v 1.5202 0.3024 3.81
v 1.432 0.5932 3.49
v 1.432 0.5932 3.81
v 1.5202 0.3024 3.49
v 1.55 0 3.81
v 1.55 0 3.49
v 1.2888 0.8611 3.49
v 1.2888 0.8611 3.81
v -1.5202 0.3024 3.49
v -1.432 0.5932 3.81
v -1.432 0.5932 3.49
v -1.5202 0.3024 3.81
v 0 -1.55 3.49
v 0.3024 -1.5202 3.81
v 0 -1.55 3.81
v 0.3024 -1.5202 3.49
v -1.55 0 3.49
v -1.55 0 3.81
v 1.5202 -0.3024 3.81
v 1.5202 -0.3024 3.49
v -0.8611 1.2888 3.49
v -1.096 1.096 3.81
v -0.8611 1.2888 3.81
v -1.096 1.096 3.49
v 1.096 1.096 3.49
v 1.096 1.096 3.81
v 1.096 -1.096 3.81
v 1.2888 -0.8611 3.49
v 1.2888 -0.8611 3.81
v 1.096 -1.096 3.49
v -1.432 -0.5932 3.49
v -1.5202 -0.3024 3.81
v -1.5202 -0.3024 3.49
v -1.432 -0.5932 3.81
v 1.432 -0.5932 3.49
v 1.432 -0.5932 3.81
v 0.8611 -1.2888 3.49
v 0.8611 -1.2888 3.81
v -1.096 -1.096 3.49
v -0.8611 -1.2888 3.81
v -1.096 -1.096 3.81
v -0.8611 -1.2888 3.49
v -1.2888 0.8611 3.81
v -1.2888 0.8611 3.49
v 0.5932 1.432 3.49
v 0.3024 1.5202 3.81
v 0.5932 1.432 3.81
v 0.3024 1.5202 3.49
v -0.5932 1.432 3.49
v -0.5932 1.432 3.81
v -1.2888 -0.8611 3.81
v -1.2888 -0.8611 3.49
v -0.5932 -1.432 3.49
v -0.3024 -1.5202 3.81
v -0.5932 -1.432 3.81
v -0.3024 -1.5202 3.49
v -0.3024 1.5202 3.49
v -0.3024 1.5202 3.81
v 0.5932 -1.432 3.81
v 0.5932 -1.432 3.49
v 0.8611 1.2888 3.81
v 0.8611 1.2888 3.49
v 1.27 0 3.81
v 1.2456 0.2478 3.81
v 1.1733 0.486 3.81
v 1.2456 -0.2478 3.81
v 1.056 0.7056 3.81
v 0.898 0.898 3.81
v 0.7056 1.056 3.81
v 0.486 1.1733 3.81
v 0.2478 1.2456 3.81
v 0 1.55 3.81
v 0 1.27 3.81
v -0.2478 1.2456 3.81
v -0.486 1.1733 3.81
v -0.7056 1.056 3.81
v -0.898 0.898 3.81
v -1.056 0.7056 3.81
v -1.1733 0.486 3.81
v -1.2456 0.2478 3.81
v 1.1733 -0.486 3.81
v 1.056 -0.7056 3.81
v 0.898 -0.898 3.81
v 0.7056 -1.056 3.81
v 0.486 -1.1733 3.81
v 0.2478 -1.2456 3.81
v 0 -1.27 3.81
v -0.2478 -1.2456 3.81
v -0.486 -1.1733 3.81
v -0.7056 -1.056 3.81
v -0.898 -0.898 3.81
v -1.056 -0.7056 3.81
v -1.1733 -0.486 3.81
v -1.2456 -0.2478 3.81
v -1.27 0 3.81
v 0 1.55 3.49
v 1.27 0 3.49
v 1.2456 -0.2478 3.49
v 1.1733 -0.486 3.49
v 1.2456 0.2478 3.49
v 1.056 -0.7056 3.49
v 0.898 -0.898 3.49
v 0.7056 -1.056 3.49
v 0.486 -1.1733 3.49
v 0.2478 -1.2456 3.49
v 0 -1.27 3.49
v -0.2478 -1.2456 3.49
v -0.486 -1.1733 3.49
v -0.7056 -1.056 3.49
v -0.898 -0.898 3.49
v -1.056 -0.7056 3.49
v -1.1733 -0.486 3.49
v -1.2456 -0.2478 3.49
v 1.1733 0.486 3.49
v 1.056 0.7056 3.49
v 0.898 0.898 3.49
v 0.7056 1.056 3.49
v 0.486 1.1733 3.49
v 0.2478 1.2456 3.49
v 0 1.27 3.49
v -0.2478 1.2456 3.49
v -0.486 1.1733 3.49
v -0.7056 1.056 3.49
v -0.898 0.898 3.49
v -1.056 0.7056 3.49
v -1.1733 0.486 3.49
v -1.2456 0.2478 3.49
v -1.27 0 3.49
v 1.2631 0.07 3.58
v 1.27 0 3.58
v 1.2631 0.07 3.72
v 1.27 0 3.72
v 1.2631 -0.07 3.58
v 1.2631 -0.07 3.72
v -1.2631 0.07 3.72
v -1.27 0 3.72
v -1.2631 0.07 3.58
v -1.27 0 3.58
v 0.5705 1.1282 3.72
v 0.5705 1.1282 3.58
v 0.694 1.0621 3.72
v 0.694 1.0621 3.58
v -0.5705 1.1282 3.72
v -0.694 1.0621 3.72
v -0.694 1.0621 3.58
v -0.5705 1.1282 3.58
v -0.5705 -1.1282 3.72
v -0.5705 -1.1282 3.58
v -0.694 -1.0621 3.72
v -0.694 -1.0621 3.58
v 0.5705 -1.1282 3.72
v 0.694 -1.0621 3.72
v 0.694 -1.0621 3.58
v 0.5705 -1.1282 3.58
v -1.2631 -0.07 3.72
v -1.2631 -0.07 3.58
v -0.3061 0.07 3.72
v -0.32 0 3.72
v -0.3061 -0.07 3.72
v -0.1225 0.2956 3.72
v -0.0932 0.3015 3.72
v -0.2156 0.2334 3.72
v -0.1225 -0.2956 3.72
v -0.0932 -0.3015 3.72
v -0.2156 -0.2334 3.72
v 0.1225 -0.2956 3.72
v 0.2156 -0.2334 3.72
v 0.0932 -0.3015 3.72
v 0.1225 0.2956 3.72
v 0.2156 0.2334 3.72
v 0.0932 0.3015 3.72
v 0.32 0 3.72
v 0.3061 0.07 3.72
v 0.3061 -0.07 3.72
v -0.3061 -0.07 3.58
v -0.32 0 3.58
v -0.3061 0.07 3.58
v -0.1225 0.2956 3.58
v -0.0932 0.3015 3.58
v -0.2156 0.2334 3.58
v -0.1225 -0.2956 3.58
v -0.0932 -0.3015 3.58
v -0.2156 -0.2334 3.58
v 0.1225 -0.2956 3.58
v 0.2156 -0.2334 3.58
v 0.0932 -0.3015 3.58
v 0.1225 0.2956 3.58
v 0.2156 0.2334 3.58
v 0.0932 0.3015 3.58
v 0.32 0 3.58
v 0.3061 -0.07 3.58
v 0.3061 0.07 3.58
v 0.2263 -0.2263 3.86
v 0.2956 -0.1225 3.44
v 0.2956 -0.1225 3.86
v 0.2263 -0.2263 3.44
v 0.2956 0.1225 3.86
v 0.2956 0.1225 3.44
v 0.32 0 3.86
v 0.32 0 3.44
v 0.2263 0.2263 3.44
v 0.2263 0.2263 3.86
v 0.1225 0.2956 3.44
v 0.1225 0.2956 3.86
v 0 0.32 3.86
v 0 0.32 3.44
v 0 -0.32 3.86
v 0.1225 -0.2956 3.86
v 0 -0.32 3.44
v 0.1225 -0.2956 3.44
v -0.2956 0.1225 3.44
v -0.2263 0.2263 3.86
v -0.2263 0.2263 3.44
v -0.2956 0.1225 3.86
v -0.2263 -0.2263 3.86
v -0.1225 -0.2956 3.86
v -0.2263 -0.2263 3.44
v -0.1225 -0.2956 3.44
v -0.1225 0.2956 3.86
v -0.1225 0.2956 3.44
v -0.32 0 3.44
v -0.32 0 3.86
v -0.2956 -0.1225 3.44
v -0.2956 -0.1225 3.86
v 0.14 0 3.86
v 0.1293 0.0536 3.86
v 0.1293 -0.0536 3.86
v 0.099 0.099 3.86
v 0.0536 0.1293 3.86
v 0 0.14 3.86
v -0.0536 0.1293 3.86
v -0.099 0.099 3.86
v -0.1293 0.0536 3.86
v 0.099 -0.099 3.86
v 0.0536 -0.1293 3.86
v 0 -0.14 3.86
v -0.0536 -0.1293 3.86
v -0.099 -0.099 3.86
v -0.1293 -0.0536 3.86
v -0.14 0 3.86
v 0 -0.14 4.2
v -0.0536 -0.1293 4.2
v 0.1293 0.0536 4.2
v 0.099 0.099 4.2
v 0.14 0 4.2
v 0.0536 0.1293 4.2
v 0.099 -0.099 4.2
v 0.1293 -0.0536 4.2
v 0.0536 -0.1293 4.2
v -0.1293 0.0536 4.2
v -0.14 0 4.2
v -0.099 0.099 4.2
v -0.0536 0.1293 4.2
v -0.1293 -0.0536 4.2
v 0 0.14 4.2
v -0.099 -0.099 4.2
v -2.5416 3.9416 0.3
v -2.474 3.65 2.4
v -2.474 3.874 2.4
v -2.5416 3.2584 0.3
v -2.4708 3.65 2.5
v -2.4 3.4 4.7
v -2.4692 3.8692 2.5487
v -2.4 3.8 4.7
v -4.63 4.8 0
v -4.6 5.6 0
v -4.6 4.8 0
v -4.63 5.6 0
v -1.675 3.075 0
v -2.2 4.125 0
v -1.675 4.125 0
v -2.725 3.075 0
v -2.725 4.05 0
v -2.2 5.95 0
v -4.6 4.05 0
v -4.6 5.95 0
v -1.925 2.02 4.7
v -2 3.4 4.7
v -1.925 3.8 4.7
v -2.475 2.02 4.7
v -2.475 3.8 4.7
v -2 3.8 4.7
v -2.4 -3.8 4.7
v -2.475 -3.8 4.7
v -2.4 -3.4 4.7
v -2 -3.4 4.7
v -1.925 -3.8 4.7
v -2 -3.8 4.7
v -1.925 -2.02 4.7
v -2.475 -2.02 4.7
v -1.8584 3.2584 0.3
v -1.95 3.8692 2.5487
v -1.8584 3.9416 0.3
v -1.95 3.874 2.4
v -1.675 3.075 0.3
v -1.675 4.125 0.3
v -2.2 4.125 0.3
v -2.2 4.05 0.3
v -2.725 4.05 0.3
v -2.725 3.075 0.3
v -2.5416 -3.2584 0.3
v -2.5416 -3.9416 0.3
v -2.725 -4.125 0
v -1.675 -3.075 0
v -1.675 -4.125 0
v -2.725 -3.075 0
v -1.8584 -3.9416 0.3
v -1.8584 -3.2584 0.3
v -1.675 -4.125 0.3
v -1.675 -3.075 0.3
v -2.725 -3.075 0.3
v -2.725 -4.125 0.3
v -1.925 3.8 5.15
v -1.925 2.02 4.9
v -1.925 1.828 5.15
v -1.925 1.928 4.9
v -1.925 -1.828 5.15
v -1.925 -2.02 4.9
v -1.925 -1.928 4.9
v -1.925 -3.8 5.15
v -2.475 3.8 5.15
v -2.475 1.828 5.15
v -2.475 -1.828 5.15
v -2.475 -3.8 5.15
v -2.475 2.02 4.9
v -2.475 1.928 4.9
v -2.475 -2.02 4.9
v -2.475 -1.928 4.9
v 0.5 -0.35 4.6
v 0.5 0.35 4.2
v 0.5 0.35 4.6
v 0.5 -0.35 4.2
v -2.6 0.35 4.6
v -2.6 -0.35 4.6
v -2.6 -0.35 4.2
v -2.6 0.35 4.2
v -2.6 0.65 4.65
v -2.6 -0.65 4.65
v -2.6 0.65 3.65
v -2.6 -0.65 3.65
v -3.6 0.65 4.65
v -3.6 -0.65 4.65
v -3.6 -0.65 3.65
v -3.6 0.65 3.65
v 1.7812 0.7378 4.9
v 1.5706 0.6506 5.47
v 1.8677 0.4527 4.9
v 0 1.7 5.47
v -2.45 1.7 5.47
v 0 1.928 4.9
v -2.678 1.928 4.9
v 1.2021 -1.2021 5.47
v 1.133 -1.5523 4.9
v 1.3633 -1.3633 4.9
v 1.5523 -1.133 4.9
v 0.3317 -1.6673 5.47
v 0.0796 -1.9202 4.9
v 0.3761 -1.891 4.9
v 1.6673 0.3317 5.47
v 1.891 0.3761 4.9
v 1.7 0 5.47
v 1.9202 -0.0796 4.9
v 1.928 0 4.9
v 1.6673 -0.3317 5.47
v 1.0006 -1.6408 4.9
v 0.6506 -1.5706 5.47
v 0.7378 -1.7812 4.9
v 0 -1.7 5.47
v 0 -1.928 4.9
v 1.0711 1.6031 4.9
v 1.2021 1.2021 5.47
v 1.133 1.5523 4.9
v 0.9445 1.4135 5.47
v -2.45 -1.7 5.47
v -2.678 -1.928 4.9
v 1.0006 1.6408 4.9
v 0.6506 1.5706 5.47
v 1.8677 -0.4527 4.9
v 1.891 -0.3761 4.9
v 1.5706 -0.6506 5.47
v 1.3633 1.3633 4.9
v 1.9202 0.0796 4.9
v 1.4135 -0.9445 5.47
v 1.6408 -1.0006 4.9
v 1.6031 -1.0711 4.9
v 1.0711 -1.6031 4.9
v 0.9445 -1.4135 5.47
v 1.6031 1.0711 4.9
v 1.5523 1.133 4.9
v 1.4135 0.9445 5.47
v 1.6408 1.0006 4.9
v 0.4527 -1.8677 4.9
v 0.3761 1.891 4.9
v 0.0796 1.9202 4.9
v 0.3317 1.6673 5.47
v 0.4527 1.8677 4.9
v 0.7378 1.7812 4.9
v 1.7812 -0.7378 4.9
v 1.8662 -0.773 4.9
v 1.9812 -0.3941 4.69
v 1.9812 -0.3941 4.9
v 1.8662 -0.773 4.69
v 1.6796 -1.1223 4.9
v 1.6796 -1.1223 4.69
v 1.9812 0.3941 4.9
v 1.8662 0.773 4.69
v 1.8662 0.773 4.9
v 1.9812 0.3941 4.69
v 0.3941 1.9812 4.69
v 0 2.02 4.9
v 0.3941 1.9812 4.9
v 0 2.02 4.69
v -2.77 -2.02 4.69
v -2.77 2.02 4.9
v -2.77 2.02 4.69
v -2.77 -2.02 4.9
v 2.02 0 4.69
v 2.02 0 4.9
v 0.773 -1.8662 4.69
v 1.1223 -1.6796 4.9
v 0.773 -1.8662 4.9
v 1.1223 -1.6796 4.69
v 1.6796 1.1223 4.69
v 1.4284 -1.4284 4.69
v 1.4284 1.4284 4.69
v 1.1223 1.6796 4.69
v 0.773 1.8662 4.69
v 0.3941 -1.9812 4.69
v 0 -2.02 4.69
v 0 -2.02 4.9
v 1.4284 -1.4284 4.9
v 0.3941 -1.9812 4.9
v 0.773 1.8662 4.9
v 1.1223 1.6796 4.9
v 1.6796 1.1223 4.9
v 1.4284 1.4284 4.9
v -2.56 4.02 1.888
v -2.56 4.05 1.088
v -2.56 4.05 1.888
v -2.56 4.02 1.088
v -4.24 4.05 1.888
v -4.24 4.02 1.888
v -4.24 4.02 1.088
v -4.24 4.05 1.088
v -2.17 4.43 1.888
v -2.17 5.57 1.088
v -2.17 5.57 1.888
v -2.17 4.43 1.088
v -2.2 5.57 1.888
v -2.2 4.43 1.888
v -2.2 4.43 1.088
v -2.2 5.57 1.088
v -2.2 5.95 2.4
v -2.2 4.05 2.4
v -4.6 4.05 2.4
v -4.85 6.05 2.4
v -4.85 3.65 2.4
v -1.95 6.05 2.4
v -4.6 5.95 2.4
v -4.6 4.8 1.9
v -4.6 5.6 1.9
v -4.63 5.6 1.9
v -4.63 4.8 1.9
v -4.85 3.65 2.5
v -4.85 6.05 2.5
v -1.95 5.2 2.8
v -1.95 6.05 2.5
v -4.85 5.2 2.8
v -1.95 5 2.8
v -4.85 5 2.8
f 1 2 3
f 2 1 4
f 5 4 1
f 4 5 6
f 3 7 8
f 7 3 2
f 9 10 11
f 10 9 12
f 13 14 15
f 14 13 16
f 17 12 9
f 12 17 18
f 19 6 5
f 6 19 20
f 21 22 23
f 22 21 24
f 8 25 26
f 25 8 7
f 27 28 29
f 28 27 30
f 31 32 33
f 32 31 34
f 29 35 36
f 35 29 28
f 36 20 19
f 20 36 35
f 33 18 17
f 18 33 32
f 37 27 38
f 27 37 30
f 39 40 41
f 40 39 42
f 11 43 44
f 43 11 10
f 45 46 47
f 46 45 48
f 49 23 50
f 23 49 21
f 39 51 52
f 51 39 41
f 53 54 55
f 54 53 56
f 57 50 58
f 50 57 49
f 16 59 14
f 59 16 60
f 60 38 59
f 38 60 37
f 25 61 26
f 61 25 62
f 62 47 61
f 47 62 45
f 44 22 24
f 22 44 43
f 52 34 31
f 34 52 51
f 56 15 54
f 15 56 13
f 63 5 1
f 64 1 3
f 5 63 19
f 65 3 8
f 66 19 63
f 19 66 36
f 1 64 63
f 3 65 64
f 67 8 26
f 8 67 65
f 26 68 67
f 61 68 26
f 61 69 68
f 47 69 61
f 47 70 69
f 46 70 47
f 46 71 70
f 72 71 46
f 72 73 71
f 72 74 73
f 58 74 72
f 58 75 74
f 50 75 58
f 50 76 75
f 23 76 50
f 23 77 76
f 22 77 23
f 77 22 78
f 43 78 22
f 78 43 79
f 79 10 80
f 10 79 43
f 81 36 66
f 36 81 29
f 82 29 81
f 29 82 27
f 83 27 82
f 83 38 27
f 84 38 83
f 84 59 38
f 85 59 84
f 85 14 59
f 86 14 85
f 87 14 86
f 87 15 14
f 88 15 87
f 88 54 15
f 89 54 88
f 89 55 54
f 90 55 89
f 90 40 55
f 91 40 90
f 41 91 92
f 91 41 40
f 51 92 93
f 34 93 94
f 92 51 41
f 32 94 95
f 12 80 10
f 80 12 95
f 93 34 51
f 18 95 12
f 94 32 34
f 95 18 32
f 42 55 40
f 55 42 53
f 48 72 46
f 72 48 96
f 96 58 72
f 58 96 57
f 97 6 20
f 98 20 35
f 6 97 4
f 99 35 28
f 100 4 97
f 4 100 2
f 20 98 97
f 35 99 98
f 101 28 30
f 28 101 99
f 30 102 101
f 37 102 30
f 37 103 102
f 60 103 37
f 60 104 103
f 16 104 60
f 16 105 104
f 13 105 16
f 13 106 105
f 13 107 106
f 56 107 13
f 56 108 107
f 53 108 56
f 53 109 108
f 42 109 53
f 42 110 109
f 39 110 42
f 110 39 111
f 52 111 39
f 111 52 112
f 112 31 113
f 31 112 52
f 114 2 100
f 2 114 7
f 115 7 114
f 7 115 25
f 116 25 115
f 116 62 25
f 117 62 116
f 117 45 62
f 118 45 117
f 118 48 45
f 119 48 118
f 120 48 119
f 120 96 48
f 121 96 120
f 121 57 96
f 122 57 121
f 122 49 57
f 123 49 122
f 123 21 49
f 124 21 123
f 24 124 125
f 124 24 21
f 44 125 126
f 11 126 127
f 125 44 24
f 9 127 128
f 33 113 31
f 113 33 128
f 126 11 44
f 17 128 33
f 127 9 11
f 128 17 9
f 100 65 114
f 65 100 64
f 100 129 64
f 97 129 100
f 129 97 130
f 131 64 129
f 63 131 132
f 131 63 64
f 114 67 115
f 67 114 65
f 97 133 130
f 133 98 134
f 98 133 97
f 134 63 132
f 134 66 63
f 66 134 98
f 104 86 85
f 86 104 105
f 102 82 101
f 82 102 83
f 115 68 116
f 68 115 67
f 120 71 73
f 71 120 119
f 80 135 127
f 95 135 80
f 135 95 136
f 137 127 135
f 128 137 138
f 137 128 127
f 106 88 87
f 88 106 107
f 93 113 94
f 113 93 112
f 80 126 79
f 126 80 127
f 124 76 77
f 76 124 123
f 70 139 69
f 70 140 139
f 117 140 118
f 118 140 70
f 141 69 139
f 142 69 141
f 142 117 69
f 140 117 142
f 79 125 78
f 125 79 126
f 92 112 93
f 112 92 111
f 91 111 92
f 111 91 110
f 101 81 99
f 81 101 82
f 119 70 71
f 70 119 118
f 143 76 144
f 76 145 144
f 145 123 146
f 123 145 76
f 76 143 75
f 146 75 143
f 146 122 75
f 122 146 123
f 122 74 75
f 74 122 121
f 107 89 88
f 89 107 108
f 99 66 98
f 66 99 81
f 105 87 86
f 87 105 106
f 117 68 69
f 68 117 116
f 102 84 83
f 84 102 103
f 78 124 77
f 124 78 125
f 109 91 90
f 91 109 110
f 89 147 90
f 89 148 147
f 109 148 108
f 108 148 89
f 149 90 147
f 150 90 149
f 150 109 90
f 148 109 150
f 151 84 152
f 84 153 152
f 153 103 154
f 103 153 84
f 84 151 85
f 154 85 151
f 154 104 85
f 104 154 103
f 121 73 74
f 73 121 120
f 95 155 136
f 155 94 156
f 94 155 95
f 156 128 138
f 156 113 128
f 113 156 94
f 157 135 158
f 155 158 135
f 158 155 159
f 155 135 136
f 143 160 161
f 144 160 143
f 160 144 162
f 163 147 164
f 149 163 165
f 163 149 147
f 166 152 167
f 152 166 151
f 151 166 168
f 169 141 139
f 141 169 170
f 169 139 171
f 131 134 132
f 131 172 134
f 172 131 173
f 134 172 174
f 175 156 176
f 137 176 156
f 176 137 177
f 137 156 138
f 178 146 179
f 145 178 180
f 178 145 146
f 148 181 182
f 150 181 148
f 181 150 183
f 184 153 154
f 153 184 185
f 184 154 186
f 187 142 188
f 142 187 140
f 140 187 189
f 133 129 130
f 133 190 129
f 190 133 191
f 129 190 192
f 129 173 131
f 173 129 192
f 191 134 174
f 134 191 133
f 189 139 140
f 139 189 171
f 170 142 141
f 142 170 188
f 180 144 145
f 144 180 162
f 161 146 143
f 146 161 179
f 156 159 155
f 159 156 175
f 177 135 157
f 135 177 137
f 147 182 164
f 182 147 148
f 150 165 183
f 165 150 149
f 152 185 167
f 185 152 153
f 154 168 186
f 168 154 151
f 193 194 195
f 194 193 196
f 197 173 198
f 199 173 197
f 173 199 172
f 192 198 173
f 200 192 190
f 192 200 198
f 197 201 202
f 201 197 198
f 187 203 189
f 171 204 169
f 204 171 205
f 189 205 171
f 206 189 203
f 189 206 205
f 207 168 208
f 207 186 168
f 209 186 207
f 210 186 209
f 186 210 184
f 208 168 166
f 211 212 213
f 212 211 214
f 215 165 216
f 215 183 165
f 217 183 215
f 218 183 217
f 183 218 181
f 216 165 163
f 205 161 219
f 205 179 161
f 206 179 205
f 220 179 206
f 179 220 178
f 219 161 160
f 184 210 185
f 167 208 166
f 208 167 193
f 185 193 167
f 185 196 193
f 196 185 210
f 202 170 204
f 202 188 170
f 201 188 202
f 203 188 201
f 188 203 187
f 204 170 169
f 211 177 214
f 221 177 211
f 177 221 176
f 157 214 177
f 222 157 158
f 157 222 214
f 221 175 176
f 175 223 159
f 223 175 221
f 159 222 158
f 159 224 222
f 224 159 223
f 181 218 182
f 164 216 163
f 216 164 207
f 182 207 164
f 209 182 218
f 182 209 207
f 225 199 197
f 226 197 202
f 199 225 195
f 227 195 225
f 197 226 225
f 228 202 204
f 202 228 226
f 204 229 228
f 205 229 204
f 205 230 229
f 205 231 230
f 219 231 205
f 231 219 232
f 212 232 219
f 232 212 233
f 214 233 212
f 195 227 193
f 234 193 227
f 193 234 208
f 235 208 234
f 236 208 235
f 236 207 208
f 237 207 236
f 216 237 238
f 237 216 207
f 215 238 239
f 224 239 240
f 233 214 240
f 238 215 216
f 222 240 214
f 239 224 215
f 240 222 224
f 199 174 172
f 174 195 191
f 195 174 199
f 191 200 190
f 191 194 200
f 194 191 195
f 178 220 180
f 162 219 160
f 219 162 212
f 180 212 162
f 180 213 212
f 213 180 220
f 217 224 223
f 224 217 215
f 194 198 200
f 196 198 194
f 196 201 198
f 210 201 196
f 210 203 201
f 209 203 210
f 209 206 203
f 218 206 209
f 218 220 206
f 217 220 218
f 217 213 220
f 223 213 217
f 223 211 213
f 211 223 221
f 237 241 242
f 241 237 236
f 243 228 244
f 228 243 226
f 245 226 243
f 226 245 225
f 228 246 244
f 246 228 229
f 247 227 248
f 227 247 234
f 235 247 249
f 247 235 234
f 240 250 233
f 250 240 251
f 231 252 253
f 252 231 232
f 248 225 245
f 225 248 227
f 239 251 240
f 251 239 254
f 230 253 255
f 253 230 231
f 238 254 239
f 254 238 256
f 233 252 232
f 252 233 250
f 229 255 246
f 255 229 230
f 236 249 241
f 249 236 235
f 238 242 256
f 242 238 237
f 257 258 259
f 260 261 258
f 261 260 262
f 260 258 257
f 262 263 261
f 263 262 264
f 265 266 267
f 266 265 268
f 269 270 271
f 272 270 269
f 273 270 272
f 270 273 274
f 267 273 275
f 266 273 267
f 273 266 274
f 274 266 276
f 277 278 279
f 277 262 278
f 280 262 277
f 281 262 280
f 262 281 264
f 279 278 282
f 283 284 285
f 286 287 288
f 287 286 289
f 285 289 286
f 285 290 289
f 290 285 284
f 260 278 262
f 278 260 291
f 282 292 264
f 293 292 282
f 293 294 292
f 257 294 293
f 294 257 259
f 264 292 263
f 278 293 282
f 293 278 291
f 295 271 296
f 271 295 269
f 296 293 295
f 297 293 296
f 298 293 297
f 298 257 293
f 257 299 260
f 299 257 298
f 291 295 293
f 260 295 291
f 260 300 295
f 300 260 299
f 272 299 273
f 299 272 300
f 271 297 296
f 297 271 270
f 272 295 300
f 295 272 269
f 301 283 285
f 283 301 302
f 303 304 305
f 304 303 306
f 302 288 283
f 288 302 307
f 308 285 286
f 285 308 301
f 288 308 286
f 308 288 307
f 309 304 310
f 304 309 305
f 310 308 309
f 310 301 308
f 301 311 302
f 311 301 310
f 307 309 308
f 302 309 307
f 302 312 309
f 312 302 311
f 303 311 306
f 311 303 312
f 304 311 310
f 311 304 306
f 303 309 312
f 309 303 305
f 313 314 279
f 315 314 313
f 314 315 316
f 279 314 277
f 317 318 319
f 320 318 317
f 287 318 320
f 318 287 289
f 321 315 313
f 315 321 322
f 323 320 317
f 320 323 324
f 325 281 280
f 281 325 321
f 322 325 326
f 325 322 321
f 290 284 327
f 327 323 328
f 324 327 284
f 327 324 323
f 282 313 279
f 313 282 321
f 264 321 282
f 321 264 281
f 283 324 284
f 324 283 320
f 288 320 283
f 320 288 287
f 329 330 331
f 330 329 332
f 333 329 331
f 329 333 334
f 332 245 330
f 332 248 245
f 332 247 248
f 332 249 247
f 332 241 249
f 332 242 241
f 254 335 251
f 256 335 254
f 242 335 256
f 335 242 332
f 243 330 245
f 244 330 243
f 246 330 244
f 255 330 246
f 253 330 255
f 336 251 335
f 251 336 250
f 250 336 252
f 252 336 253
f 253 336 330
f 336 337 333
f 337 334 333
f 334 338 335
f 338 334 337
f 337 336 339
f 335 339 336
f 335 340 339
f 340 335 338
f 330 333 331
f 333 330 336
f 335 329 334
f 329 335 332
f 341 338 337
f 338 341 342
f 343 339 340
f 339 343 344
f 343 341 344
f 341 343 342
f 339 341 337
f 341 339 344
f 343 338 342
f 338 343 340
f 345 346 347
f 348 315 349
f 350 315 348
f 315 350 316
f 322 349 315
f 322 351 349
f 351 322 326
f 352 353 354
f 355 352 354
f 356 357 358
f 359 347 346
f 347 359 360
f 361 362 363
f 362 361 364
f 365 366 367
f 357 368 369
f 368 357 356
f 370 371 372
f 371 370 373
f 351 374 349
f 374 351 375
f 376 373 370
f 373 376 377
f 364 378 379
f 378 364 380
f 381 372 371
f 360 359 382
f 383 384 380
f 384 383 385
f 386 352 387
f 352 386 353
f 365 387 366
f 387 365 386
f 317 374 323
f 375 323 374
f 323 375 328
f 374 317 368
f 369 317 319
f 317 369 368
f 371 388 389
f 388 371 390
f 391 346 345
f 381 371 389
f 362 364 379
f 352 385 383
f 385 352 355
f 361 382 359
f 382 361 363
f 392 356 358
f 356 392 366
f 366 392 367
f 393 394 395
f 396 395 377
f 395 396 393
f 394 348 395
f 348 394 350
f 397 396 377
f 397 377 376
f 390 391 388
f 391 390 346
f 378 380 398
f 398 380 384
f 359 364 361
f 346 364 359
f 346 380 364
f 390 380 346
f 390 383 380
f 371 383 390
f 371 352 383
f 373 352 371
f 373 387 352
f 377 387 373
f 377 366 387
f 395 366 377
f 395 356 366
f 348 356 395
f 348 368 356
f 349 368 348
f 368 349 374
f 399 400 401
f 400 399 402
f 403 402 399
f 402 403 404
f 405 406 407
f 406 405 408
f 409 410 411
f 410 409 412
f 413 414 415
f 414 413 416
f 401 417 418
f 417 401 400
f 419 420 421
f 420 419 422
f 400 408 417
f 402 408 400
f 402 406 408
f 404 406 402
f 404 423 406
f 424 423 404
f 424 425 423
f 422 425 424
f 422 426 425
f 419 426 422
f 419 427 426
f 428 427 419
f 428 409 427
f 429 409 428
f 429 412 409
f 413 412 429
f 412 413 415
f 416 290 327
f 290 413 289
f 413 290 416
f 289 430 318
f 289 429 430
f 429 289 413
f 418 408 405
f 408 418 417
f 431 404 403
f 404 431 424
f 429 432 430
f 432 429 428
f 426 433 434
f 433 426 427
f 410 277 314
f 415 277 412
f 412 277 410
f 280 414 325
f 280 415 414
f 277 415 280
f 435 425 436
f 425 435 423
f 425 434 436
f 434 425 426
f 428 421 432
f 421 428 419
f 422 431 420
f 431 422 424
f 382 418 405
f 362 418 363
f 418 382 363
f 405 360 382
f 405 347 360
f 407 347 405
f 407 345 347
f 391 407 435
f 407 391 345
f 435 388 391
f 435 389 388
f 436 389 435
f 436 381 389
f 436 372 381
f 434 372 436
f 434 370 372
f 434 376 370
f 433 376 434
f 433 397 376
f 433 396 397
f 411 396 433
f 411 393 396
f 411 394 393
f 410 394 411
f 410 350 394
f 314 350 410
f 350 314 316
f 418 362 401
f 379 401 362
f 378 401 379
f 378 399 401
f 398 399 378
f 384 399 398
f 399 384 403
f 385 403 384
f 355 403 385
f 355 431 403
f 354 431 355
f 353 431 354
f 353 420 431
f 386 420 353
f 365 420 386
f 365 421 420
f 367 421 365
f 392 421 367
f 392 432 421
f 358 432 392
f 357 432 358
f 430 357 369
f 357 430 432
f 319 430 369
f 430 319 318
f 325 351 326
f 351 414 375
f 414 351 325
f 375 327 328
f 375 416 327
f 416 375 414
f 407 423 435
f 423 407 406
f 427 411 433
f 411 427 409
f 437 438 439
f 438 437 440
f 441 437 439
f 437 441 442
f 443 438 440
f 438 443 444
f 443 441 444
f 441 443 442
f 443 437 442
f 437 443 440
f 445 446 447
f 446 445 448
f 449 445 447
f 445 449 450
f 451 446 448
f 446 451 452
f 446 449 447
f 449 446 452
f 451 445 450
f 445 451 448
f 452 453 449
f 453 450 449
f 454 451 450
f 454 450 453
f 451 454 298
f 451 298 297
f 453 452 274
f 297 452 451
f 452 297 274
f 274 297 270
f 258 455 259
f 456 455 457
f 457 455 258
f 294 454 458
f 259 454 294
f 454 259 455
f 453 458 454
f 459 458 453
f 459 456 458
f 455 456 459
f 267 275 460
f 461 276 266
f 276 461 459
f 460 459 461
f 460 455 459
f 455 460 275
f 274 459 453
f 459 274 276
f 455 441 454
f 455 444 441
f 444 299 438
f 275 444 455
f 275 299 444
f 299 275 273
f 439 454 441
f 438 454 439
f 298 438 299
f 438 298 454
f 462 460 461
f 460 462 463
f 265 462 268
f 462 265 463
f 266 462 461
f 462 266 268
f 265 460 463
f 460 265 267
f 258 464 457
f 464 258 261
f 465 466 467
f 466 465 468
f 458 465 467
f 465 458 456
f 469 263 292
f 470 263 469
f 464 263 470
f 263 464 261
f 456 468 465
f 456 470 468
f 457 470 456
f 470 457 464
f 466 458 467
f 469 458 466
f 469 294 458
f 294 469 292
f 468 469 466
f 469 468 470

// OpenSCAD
// Lift station — chairlift bottom / top terminal. A portal frame stands
// behind the load point and carries a boom; the bullwheel hangs from the
// boom under a shallow terminal hood, with an operator's hut beside the
// line.
//
// The bullwheel is centred on the origin at cable height (BullwheelHeight
// in internal/world/lift.go) with its rim at the cable gap (CableGap), so
// the up and down cables, which end at the origin 1.5 m either side, meet
// the wheel where they would wrap it. Chairs turn around at the origin and
// only run on the +X side, and the lift line queues along -X on the
// centreline (Lift.QueueSlotXZ), so the frame keeps its legs outside the
// chairs' sweep and nothing stands on the centreline at ground level.
//
// Sides: chairs carry riders up on -Y (the game's +Z after export) and
// come back empty on +Y, so the hut stands on +Y.
//
// Conventions, units, and axis docs: see models-src/README.md.

$fn = 16;

// ── Dimensions (metres) ────────────────────────────────────────────────
cable_h   = 3.65; // world.BullwheelHeight: cable height at the wheel
cable_gap = 1.50; // world.CableGap: up / down cable either side of the axis

// Bullwheel — vertical axis, horizontal disc, rim at the cable gap.
bw_r      = cable_gap + 0.05; // rim outer radius; the cable sits in its groove
bw_rim    = 0.28;             // radial depth of the rim
bw_thick  = 0.32;
hub_r     = 0.32;
spokes    = 6;

// Portal frame behind the wheel.
frame_x   = -2.2;  // legs and crossbeam, behind the wheel's rim
leg_y     = 3.6;   // outside the chairs (cable gap + about a chair's width)
leg_base  = 0.70;  // leg footprint at the ground
leg_top   = 0.40;  // and where it meets the crossbeam
frame_h   = 4.70;  // underside of the crossbeam
beam_h    = 0.45;  // crossbeam depth

// Boom from the crossbeam out over the wheel.
boom_w    = 0.70;
boom_h    = 0.40;
boom_z    = frame_h - 0.10 - boom_h; // just under the crossbeam

// Terminal hood over the wheel and boom.
hood_r    = 2.00;  // front radius, over the wheel
hood_back = -2.75; // back edge, past the crossbeam
hood_z    = frame_h;
hood_h    = 0.75;
hood_in   = 0.30;  // top edge inset, for a chamfered look

// Operator hut beside the empty side of the line.
hut_x     = -3.4;
hut_y     = 5.0;
hut_l     = 2.4;   // along X
hut_w     = 1.9;   // along Y
hut_h     = 2.4;

// ── Bullwheel ──────────────────────────────────────────────────────────
module bullwheel() {
    translate([0, 0, cable_h]) {
        // Rim: a ring whose outer edge carries the cable.
        color("Goldenrod")
            difference() {
                cylinder(h = bw_thick, r = bw_r, center = true, $fn = 32);
                cylinder(h = bw_thick + 0.02, r = bw_r - bw_rim, center = true, $fn = 32);
            }
        // Spokes and hub.
        color("DarkSlateGray") {
            for (i = [0 : spokes - 1])
                rotate([0, 0, i * 360 / spokes])
                    translate([(bw_r - bw_rim / 2) / 2, 0, 0])
                        cube([bw_r - bw_rim / 2, 0.14, 0.14], center = true);
            cylinder(h = 0.42, r = hub_r, center = true);
        }
    }
    // Shaft up to the boom.
    color("DimGray")
        translate([0, 0, cable_h + 0.2])
            cylinder(h = boom_z - cable_h - 0.2 + 0.01, r = 0.14);
}

// ── Portal frame and boom ──────────────────────────────────────────────
module leg(y) {
    color("SlateGray")
        hull() {
            translate([frame_x, y, 0.02])
                cube([leg_base, leg_base, 0.04], center = true);
            translate([frame_x, y, frame_h - 0.02])
                cube([leg_top, leg_top, 0.04], center = true);
        }
    // Concrete footing.
    color("Silver")
        translate([frame_x, y, 0.15])
            cube([leg_base + 0.35, leg_base + 0.35, 0.30], center = true);
}

module frame() {
    leg(leg_y);
    leg(-leg_y);
    color("SlateGray")
        translate([frame_x, 0, frame_h + beam_h / 2])
            cube([0.55, 2 * leg_y + leg_top, beam_h], center = true);
    // Boom: from behind the crossbeam out past the wheel's centre.
    color("LightSlateGray")
        translate([(frame_x - 0.4 + 0.5) / 2, 0, boom_z + boom_h / 2])
            cube([0.5 - (frame_x - 0.4), boom_w, boom_h], center = true);
    // Drive housing on the back of the crossbeam.
    color("DimGray")
        translate([frame_x - 0.9, 0, frame_h - 0.55])
            cube([1.0, 1.3, 1.0], center = true);
}

// ── Hood ───────────────────────────────────────────────────────────────
// A slab rounded over the wheel and square at the back, its top edge
// drawn in.
module hood_slab(inset, z) {
    translate([0, 0, z])
        hull() {
            cylinder(h = 0.02, r = hood_r - inset, $fn = 32);
            translate([hood_back + inset, -(hood_r - inset), 0])
                cube([0.02, 2 * (hood_r - inset), 0.02]);
        }
}

module hood() {
    color("Gainsboro")
        hull() {
            hood_slab(0, hood_z);
            hood_slab(hood_in, hood_z + hood_h);
        }
    // A coloured band round the hood's lower edge.
    color("SteelBlue")
        hull() {
            hood_slab(-0.02, hood_z - 0.01);
            hood_slab(-0.02, hood_z + 0.18);
        }
}

// ── Operator hut ───────────────────────────────────────────────────────
module hut() {
    translate([hut_x, hut_y, 0]) {
        // Walls.
        color("Sienna")
            translate([0, 0, hut_h / 2])
                cube([hut_l, hut_w, hut_h], center = true);
        // Windows facing the line (-Y) and the load point (+X).
        color("LightSteelBlue") {
            translate([0, -hut_w / 2 - 0.01, hut_h * 0.62])
                cube([hut_l * 0.7, 0.04, 0.8], center = true);
            translate([hut_l / 2 + 0.01, 0, hut_h * 0.62])
                cube([0.04, hut_w * 0.6, 0.8], center = true);
        }
        // Door on the back.
        color("SaddleBrown")
            translate([-hut_l / 2 - 0.01, 0.2, 0.95])
                cube([0.04, 0.8, 1.9], center = true);
        // Roof: a shallow pitch with an overhang.
        color("DarkSlateGray")
            hull() {
                translate([0, -0.15, hut_h + 0.05])
                    cube([hut_l + 0.5, hut_w + 0.5, 0.1], center = true);
                translate([0, 0.1, hut_h + 0.35])
                    cube([hut_l + 0.5, 0.2, 0.1], center = true);
            }
    }
}

module lift_station() {
    bullwheel();
    frame();
    hood();
    hut();
}

lift_station();
